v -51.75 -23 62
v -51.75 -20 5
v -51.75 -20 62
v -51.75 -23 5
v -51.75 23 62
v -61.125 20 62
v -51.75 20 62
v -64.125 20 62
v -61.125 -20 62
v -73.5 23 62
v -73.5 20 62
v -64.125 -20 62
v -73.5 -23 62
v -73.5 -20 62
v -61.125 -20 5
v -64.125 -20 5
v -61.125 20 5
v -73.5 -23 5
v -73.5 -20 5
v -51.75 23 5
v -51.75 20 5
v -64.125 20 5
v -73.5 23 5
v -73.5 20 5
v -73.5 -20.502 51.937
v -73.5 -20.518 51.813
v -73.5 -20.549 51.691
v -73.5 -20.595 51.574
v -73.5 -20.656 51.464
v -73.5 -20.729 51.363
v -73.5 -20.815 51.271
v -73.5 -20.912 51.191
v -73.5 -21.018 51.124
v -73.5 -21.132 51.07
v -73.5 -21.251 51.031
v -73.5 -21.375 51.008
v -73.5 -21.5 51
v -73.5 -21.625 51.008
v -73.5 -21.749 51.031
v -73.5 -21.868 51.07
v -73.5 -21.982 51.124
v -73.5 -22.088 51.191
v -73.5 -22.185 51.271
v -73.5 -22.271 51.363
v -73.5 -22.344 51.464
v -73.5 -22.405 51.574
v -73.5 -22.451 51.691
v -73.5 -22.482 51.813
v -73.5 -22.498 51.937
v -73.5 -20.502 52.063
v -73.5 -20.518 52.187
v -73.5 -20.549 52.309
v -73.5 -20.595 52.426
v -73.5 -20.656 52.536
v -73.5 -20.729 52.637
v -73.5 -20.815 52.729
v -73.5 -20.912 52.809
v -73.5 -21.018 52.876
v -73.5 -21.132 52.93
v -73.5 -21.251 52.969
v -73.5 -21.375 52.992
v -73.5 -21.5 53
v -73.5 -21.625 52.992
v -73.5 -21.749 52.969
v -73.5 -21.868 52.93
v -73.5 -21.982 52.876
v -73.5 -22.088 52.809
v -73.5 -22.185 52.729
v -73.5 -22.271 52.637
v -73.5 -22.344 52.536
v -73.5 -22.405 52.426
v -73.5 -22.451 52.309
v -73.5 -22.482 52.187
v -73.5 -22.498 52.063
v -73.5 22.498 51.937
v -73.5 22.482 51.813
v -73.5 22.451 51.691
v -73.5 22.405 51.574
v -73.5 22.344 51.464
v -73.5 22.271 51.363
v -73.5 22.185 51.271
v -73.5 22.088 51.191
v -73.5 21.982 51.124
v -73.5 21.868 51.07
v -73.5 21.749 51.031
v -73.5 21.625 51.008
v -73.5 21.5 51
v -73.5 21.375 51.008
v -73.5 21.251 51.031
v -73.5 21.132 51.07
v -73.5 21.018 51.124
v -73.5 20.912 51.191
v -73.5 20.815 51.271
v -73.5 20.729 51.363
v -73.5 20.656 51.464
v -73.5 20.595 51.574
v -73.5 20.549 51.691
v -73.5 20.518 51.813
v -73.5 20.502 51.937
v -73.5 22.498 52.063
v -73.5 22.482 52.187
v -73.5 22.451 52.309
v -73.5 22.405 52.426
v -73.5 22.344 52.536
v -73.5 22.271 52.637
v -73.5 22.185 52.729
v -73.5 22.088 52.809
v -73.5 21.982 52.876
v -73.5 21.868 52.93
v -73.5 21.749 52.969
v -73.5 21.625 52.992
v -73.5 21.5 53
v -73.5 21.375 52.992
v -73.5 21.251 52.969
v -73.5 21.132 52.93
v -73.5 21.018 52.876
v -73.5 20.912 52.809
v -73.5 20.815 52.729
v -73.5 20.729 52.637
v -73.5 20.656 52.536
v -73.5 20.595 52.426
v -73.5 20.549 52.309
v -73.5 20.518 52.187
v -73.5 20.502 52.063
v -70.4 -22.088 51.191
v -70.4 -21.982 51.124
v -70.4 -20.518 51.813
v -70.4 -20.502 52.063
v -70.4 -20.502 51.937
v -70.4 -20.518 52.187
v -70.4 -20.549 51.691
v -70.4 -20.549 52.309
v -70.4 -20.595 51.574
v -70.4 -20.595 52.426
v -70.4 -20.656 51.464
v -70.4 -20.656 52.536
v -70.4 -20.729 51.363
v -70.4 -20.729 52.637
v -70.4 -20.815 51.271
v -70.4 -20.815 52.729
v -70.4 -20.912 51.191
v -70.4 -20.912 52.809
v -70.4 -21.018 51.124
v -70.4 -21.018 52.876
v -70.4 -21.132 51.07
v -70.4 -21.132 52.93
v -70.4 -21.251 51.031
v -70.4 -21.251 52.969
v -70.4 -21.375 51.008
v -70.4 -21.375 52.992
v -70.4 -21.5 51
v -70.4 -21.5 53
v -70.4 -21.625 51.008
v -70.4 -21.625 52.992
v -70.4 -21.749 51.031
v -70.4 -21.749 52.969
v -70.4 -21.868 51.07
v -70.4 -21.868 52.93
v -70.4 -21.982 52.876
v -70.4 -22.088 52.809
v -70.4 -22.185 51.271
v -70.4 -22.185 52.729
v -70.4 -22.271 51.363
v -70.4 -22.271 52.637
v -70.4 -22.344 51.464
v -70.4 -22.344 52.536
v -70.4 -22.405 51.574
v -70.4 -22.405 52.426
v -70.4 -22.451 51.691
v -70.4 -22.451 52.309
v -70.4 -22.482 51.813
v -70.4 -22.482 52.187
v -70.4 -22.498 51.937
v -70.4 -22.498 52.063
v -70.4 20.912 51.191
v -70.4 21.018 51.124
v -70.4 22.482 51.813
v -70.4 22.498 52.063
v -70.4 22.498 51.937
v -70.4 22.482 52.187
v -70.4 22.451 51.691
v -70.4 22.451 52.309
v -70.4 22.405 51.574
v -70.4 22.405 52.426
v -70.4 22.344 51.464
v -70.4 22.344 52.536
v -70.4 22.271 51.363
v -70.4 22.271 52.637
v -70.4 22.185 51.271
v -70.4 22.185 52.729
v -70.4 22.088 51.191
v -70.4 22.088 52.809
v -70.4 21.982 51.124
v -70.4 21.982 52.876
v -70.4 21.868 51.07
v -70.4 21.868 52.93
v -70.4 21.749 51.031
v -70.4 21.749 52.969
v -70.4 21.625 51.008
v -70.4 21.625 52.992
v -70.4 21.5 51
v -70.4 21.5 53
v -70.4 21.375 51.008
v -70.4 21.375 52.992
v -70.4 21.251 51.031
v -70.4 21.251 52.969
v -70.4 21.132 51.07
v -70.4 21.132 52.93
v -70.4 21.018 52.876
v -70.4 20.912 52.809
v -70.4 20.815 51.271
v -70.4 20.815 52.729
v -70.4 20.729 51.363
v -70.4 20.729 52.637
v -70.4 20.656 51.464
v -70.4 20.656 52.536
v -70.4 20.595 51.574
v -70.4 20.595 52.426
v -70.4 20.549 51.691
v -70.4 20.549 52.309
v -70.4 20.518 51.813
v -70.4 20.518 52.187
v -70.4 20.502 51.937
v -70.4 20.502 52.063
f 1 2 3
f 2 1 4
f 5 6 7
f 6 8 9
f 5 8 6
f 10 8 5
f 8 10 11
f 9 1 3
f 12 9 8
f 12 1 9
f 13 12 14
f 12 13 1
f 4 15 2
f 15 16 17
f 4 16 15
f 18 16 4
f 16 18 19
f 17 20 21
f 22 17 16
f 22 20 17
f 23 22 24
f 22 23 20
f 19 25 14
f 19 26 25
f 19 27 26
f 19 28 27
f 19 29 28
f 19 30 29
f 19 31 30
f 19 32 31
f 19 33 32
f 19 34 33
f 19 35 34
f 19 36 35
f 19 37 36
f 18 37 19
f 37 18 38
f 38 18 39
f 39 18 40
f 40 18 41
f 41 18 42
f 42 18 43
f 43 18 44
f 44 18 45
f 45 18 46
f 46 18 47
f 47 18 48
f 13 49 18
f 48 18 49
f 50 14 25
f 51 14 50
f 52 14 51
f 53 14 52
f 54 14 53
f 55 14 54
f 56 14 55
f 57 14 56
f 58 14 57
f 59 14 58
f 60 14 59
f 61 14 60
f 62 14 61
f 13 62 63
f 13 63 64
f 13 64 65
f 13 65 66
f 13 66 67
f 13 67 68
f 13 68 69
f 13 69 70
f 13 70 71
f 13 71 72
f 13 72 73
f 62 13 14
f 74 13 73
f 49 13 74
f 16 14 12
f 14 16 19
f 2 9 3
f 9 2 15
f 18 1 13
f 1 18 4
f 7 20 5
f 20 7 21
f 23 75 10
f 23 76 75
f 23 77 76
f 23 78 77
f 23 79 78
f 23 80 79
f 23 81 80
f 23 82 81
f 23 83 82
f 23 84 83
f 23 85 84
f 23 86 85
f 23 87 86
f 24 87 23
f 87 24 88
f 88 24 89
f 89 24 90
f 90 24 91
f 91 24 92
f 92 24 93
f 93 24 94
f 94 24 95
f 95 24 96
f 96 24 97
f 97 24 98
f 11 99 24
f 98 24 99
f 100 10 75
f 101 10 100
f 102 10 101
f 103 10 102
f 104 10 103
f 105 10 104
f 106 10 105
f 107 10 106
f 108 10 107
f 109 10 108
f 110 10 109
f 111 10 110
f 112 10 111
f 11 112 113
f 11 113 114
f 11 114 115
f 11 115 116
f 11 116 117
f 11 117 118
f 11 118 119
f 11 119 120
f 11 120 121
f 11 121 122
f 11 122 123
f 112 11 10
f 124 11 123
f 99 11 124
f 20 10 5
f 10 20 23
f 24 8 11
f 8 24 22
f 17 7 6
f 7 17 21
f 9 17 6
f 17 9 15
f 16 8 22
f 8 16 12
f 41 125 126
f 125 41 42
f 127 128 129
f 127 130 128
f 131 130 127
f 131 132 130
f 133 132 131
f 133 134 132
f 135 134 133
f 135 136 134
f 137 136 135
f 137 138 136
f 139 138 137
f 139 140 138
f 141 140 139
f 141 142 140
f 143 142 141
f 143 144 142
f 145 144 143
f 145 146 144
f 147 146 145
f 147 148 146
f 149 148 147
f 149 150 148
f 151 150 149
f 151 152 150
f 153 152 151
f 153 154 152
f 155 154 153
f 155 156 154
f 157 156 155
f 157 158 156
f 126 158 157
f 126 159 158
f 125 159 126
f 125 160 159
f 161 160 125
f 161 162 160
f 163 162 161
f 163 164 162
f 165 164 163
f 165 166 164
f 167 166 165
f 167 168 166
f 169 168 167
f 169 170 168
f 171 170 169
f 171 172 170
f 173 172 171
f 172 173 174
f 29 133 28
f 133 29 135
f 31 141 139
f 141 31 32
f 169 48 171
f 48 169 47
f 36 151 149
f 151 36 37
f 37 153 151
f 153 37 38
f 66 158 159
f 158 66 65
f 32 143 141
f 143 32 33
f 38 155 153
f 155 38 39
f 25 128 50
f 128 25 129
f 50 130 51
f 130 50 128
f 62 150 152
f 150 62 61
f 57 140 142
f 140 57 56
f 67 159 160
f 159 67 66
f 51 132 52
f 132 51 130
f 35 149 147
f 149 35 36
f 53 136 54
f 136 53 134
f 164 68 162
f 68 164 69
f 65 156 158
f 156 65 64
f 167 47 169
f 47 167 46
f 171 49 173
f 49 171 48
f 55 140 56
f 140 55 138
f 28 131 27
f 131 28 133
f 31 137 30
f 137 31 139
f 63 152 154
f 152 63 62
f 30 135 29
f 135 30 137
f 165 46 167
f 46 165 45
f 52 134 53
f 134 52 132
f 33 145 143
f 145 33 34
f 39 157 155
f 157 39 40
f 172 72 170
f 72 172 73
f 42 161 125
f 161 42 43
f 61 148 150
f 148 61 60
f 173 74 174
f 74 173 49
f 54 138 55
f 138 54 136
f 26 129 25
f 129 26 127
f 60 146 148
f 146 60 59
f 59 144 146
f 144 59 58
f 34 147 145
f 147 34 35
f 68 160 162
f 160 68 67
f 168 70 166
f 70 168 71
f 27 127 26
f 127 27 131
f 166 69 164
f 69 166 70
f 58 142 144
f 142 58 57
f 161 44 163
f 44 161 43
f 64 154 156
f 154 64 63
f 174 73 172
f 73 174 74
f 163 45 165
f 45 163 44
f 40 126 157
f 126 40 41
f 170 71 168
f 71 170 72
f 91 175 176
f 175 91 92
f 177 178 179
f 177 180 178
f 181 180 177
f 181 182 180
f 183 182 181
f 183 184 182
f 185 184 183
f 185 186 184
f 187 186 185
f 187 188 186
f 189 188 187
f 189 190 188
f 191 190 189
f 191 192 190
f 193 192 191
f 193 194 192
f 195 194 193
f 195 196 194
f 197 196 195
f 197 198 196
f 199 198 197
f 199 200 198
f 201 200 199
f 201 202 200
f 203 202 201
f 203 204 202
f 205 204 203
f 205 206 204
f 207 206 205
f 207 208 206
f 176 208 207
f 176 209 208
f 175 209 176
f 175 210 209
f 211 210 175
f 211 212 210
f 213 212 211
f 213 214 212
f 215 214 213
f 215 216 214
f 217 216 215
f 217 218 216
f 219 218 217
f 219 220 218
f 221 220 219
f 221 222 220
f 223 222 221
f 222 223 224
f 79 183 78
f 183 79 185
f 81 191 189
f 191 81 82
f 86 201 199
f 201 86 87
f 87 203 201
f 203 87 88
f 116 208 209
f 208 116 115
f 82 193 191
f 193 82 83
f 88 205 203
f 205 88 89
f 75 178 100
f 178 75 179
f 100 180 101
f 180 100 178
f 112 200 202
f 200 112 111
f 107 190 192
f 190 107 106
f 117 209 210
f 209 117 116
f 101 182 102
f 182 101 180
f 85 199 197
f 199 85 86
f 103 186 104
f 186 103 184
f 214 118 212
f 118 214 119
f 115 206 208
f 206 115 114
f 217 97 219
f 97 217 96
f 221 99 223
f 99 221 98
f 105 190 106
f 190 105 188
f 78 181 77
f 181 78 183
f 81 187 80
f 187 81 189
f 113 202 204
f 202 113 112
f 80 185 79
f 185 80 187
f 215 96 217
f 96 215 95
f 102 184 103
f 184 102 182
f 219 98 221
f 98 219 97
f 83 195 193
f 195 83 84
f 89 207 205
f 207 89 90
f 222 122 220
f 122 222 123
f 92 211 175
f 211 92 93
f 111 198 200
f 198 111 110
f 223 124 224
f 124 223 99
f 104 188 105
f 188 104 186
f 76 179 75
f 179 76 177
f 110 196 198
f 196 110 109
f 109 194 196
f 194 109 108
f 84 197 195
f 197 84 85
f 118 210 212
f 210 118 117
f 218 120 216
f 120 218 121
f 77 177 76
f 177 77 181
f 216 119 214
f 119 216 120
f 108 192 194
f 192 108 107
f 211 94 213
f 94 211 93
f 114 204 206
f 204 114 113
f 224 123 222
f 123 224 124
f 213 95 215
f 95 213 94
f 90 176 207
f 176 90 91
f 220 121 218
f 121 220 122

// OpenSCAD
//// VARS

w_th = 3;
wid = 103.5;
hei = 57;
dep = 50;
co_wid = 150;
co_hei = 87.5;
co_dep = 5;
fr_hei = 65.5;
fr_wid = 111.5;
fr_dep = 3;
h_v_spa = 43;
h_rad = 1;
bay_w = 147;
f_h_dis = 52;
s_dep = 57;
pad = 0.1;		// DON'T TOUCH THIS LINE
$fn = 50;
//$fn = 150;			// DON'T TOUCH THIS LINE
//wid = 170;		// Width
//hei = 75;			// Height
//len = 40;			// Length
//f_th = 5;			// Front thickness
//b_th = 5;			// Back thickness
//i_th = 2.5;		// Inward thickness
//l_rad = 2.5;		// Led radius
//v_led_sp = 40;	// Vertical space between leds
//l_e_sp = 7.5;	// space between led center and inner edge
//s_rad = 1.5;		// Screws radius
//s_h_dep = 3;		// Screw head depth
//s_h_rad = 3;		// Screw head radius
//s_dep = 10;		// Screw hole depth
//v_nb_led = 4 - 1;

difference() {
	union() {
//		translate([0, 0, (co_dep / 2)]) cube(size = [co_wid, co_hei, co_dep], center = true);
		translate([-((bay_w / 2) - ((bay_w - wid) / 4)), -(h_v_spa / 2), ((s_dep / 2) + co_dep)]) cube(size = [((bay_w - wid) / 2), w_th, s_dep], center = true);
		translate([-((bay_w / 2) - ((bay_w - wid) / 4)), (h_v_spa / 2), ((s_dep / 2) + co_dep)]) cube(size = [((bay_w - wid) / 2), w_th, s_dep], center = true);
//		translate([((bay_w / 2) - ((bay_w - wid) / 4)), (h_v_spa / 2), ((s_dep / 2) + co_dep)]) cube(size = [((bay_w - wid) / 2), w_th, s_dep], center = true);
//		translate([((bay_w / 2) - ((bay_w - wid) / 4)), -(h_v_spa / 2), ((s_dep / 2) + co_dep)]) cube(size = [((bay_w - wid) / 2), w_th, s_dep], center = true);
		translate([-((bay_w / 2) - ((bay_w - wid) / 4)), 0, ((s_dep / 2) + co_dep)]) cube(size = [w_th, (h_v_spa - w_th), s_dep], center = true);
//		translate([((bay_w / 2) - ((bay_w - wid) / 4)), 0, ((s_dep / 2) + co_dep)]) cube(size = [w_th, (h_v_spa - w_th), s_dep], center = true);
	}
	union() {
//		translate([0, 0, ((dep / 2) - pad)]) cube(size = [wid, hei, (dep + pad)], center = true);
		translate([0, 0, ((fr_dep / 2) - pad)]) cube(size = [fr_wid, fr_hei, (fr_dep + pad)], center = true);
		translate([-((bay_w - w_th) / 2), -(h_v_spa / 2), f_h_dis]) rotate([0, 90, 0]) cylinder(h = (w_th + (pad * 2)), r = h_rad, center = true);
		translate([-((bay_w - w_th) / 2), (h_v_spa / 2), f_h_dis]) rotate([0, 90, 0]) cylinder(h = (w_th + (pad * 2)), r = h_rad, center = true);
		translate([((bay_w - w_th) / 2), (h_v_spa / 2), f_h_dis]) rotate([0, 90, 0]) cylinder(h = (w_th + (pad * 2)), r = h_rad, center = true);
		translate([((bay_w - w_th) / 2), -(h_v_spa / 2), f_h_dis]) rotate([0, 90, 0]) cylinder(h = (w_th + (pad * 2)), r = h_rad, center = true);
	}
}





//// MODULES

//module case() {
//	union() {
//		intersection() {
//			union() {
//				translate([0, -((len + f_th) / 2), 0]) cube(size = [wid, f_th, hei], center = true);
//				translate([0, ((len + b_th) / 2), 0]) cube(size = [wid, b_th, hei], center = true);
//			}
//			scale([1.2,0.5,2]) sphere(r = 75);
//		}
//
//
//		difference() {
//			cube(size = [(70 + (l_e_sp * 2)), len, (v_led_sp + (l_e_sp * 2))], center = true);
//			cube(size = [(70 + (l_e_sp * 2) - (i_th * 2)), len + pad, (v_led_sp + (l_e_sp * 2) - (i_th * 2))], center = true);
//		}
//	}
//}
//
//module ledHole() {
//	union() {
//		translate([-35, -((len + f_th) / 2), -(v_led_sp / 2)]) rotate([90, 0, 0]) cylinder(h = (f_th + (pad * 2)), r = l_rad, center = true);
//		translate([-15, -((len + f_th) / 2), -(v_led_sp / 2)]) rotate([90, 0, 0]) cylinder(h = (f_th + (pad * 2)), r = l_rad, center = true);
//		translate([15, -((len + f_th) / 2), -(v_led_sp / 2)]) rotate([90, 0, 0]) cylinder(h = (f_th + (pad * 2)), r = l_rad, center = true);
//		translate([35, -((len + f_th) / 2), -(v_led_sp / 2)]) rotate([90, 0, 0]) cylinder(h = (f_th + (pad * 2)), r = l_rad, center = true);
//		
//		translate([-35, -((len + f_th) / 2), -((v_led_sp / 2) - ((v_led_sp / v_nb_led) * 1))]) rotate([90, 0, 0]) cylinder(h = (f_th + (pad * 2)), r = l_rad, center = true);
//		translate([-15, -((len + f_th) / 2), -((v_led_sp / 2) - ((v_led_sp / v_nb_led) * 1))]) rotate([90, 0, 0]) cylinder(h = (f_th + (pad * 2)), r = l_rad, center = true);
//		translate([15, -((len + f_th) / 2), -((v_led_sp / 2) - ((v_led_sp / v_nb_led) * 1))]) rotate([90, 0, 0]) cylinder(h = (f_th + (pad * 2)), r = l_rad, center = true);
//		translate([35, -((len + f_th) / 2), -((v_led_sp / 2) - ((v_led_sp / v_nb_led) * 1))]) rotate([90, 0, 0]) cylinder(h = (f_th + (pad * 2)), r = l_rad, center = true);
//		
//		translate([-15, -((len + f_th) / 2), -((v_led_sp / 2) - ((v_led_sp / v_nb_led) * 2))]) rotate([90, 0, 0]) cylinder(h = (f_th + (pad * 2)), r = l_rad, center = true);
//		translate([15, -((len + f_th) / 2), -((v_led_sp / 2) - ((v_led_sp / v_nb_led) * 2))]) rotate([90, 0, 0]) cylinder(h = (f_th + (pad * 2)), r = l_rad, center = true);
//		translate([35, -((len + f_th) / 2), -((v_led_sp / 2) - ((v_led_sp / v_nb_led) * 2))]) rotate([90, 0, 0]) cylinder(h = (f_th + (pad * 2)), r = l_rad, center = true);
//		
//		translate([-15, -((len + f_th) / 2), (v_led_sp / 2)]) rotate([90, 0, 0]) cylinder(h = (f_th + (pad * 2)), r = l_rad, center = true);
//		translate([35, -((len + f_th) / 2), (v_led_sp / 2)]) rotate([90, 0, 0]) cylinder(h = (f_th + (pad * 2)), r = l_rad, center = true);
//	}
//}
//
//// Screw
//
//module screwa() {
//	rotate([-90, 0, 0]) {
//		cylinder(h = s_h_dep, r = s_h_rad);
//		translate([0, 0, (s_h_dep - pad)]) cylinder(h = (s_dep + pad), r = s_rad);
//	}
//}
//
//module screwb() {
//	rotate([90, 0, 0]) {
//		cylinder(h = s_h_dep, r = s_h_rad);
//		translate([0, 0, (s_h_dep - pad)]) cylinder(h = (s_dep + pad), r = s_rad);
//	}
//}


//// DESIGN

//difference() {
//	union() {
//		case();
//		translate([-((70 + (l_e_sp * 2)) / 2), 0, -((v_led_sp + (l_e_sp * 2)) / 2)]) rotate([90, 0, 0]) cylinder(h = len, r = (s_rad + i_th), center = true);
//		translate([-((70 + (l_e_sp * 2)) / 2), 0, ((v_led_sp + (l_e_sp * 2)) / 2)]) rotate([90, 0, 0]) cylinder(h = len, r = (s_rad + i_th), center = true);
//		translate([((70 + (l_e_sp * 2)) / 2), 0, -((v_led_sp + (l_e_sp * 2)) / 2)]) rotate([90, 0, 0]) cylinder(h = len, r = (s_rad + i_th), center = true);
//		translate([((70 + (l_e_sp * 2)) / 2), 0, ((v_led_sp + (l_e_sp * 2)) / 2)]) rotate([90, 0, 0]) cylinder(h = len, r = (s_rad + i_th), center = true);
//	}
//	union() {
//		ledHole();
//
//		translate([-((70 + (l_e_sp * 2)) / 2), -(((len + pad) / 2) + f_th), -((v_led_sp + (l_e_sp * 2)) / 2)]) screwa();
//		translate([-((70 + (l_e_sp * 2)) / 2), -(((len + pad) / 2) + f_th), ((v_led_sp + (l_e_sp * 2)) / 2)]) screwa();
//		translate([((70 + (l_e_sp * 2)) / 2), -(((len + pad) / 2) + f_th), -((v_led_sp + (l_e_sp * 2)) / 2)]) screwa();
//		translate([((70 + (l_e_sp * 2)) / 2), -(((len + pad) / 2) + f_th), ((v_led_sp + (l_e_sp * 2)) / 2)]) screwa();
//
//		translate([-((70 + (l_e_sp * 2)) / 2), (((len + pad) / 2) + b_th), -((v_led_sp + (l_e_sp * 2)) / 2)]) screwb();
//		translate([-((70 + (l_e_sp * 2)) / 2), (((len + pad) / 2) + b_th), ((v_led_sp + (l_e_sp * 2)) / 2)]) screwb();
//		translate([((70 + (l_e_sp * 2)) / 2), (((len + pad) / 2) + b_th), -((v_led_sp + (l_e_sp * 2)) / 2)]) screwb();
//		translate([((70 + (l_e_sp * 2)) / 2), (((len + pad) / 2) + b_th), ((v_led_sp + (l_e_sp * 2)) / 2)]) screwb();
//	}
//}
